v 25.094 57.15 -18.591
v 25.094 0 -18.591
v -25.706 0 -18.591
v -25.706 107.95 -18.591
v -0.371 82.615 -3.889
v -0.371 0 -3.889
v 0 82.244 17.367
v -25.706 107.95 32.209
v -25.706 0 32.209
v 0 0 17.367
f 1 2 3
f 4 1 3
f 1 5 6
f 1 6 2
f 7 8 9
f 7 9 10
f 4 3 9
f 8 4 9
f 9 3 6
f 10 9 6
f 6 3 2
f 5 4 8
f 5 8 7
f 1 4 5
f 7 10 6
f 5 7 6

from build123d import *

# Parameters (mm, degrees)
BOSS_EXTRUDE1_DEPTH     = 107.95
CUT_EXTRUDE1_DEPTH      = 116.548362966
CUT_EXTRUDE1_DEPTH_BACK = 116.548362966


with BuildPart() as part:
    # Sketch1 → Boss-Extrude1 (new body)
    with BuildSketch(Plane(origin=(0, 0, 0), x_dir=(1, 0, 0), z_dir=(0, 1, 0))):
        Polygon((25.093975904, 18.590963855), (-25.706024096, 18.590963855), (-25.706024096, -32.209036145), (0.000274042, -17.367497994), (-0.370757644, 3.888893087), align=None)
    extrude(amount=BOSS_EXTRUDE1_DEPTH)

    # Sketch2 → Cut-Extrude1 (cut, two sides: drawn at the far end of the back side and taken through both)
    with BuildSketch(Plane.XY.offset(-CUT_EXTRUDE1_DEPTH_BACK)):
        Polygon((-201.500786154, 283.744762058), (-25.706024096, 107.95), (25.093975904, 57.15), (200.888737961, -118.644762058), (552.478262077, 232.944762058), (150.088737961, 635.334286173), align=None)
    extrude(amount=CUT_EXTRUDE1_DEPTH + CUT_EXTRUDE1_DEPTH_BACK, mode=Mode.SUBTRACT)


solid = part.part
